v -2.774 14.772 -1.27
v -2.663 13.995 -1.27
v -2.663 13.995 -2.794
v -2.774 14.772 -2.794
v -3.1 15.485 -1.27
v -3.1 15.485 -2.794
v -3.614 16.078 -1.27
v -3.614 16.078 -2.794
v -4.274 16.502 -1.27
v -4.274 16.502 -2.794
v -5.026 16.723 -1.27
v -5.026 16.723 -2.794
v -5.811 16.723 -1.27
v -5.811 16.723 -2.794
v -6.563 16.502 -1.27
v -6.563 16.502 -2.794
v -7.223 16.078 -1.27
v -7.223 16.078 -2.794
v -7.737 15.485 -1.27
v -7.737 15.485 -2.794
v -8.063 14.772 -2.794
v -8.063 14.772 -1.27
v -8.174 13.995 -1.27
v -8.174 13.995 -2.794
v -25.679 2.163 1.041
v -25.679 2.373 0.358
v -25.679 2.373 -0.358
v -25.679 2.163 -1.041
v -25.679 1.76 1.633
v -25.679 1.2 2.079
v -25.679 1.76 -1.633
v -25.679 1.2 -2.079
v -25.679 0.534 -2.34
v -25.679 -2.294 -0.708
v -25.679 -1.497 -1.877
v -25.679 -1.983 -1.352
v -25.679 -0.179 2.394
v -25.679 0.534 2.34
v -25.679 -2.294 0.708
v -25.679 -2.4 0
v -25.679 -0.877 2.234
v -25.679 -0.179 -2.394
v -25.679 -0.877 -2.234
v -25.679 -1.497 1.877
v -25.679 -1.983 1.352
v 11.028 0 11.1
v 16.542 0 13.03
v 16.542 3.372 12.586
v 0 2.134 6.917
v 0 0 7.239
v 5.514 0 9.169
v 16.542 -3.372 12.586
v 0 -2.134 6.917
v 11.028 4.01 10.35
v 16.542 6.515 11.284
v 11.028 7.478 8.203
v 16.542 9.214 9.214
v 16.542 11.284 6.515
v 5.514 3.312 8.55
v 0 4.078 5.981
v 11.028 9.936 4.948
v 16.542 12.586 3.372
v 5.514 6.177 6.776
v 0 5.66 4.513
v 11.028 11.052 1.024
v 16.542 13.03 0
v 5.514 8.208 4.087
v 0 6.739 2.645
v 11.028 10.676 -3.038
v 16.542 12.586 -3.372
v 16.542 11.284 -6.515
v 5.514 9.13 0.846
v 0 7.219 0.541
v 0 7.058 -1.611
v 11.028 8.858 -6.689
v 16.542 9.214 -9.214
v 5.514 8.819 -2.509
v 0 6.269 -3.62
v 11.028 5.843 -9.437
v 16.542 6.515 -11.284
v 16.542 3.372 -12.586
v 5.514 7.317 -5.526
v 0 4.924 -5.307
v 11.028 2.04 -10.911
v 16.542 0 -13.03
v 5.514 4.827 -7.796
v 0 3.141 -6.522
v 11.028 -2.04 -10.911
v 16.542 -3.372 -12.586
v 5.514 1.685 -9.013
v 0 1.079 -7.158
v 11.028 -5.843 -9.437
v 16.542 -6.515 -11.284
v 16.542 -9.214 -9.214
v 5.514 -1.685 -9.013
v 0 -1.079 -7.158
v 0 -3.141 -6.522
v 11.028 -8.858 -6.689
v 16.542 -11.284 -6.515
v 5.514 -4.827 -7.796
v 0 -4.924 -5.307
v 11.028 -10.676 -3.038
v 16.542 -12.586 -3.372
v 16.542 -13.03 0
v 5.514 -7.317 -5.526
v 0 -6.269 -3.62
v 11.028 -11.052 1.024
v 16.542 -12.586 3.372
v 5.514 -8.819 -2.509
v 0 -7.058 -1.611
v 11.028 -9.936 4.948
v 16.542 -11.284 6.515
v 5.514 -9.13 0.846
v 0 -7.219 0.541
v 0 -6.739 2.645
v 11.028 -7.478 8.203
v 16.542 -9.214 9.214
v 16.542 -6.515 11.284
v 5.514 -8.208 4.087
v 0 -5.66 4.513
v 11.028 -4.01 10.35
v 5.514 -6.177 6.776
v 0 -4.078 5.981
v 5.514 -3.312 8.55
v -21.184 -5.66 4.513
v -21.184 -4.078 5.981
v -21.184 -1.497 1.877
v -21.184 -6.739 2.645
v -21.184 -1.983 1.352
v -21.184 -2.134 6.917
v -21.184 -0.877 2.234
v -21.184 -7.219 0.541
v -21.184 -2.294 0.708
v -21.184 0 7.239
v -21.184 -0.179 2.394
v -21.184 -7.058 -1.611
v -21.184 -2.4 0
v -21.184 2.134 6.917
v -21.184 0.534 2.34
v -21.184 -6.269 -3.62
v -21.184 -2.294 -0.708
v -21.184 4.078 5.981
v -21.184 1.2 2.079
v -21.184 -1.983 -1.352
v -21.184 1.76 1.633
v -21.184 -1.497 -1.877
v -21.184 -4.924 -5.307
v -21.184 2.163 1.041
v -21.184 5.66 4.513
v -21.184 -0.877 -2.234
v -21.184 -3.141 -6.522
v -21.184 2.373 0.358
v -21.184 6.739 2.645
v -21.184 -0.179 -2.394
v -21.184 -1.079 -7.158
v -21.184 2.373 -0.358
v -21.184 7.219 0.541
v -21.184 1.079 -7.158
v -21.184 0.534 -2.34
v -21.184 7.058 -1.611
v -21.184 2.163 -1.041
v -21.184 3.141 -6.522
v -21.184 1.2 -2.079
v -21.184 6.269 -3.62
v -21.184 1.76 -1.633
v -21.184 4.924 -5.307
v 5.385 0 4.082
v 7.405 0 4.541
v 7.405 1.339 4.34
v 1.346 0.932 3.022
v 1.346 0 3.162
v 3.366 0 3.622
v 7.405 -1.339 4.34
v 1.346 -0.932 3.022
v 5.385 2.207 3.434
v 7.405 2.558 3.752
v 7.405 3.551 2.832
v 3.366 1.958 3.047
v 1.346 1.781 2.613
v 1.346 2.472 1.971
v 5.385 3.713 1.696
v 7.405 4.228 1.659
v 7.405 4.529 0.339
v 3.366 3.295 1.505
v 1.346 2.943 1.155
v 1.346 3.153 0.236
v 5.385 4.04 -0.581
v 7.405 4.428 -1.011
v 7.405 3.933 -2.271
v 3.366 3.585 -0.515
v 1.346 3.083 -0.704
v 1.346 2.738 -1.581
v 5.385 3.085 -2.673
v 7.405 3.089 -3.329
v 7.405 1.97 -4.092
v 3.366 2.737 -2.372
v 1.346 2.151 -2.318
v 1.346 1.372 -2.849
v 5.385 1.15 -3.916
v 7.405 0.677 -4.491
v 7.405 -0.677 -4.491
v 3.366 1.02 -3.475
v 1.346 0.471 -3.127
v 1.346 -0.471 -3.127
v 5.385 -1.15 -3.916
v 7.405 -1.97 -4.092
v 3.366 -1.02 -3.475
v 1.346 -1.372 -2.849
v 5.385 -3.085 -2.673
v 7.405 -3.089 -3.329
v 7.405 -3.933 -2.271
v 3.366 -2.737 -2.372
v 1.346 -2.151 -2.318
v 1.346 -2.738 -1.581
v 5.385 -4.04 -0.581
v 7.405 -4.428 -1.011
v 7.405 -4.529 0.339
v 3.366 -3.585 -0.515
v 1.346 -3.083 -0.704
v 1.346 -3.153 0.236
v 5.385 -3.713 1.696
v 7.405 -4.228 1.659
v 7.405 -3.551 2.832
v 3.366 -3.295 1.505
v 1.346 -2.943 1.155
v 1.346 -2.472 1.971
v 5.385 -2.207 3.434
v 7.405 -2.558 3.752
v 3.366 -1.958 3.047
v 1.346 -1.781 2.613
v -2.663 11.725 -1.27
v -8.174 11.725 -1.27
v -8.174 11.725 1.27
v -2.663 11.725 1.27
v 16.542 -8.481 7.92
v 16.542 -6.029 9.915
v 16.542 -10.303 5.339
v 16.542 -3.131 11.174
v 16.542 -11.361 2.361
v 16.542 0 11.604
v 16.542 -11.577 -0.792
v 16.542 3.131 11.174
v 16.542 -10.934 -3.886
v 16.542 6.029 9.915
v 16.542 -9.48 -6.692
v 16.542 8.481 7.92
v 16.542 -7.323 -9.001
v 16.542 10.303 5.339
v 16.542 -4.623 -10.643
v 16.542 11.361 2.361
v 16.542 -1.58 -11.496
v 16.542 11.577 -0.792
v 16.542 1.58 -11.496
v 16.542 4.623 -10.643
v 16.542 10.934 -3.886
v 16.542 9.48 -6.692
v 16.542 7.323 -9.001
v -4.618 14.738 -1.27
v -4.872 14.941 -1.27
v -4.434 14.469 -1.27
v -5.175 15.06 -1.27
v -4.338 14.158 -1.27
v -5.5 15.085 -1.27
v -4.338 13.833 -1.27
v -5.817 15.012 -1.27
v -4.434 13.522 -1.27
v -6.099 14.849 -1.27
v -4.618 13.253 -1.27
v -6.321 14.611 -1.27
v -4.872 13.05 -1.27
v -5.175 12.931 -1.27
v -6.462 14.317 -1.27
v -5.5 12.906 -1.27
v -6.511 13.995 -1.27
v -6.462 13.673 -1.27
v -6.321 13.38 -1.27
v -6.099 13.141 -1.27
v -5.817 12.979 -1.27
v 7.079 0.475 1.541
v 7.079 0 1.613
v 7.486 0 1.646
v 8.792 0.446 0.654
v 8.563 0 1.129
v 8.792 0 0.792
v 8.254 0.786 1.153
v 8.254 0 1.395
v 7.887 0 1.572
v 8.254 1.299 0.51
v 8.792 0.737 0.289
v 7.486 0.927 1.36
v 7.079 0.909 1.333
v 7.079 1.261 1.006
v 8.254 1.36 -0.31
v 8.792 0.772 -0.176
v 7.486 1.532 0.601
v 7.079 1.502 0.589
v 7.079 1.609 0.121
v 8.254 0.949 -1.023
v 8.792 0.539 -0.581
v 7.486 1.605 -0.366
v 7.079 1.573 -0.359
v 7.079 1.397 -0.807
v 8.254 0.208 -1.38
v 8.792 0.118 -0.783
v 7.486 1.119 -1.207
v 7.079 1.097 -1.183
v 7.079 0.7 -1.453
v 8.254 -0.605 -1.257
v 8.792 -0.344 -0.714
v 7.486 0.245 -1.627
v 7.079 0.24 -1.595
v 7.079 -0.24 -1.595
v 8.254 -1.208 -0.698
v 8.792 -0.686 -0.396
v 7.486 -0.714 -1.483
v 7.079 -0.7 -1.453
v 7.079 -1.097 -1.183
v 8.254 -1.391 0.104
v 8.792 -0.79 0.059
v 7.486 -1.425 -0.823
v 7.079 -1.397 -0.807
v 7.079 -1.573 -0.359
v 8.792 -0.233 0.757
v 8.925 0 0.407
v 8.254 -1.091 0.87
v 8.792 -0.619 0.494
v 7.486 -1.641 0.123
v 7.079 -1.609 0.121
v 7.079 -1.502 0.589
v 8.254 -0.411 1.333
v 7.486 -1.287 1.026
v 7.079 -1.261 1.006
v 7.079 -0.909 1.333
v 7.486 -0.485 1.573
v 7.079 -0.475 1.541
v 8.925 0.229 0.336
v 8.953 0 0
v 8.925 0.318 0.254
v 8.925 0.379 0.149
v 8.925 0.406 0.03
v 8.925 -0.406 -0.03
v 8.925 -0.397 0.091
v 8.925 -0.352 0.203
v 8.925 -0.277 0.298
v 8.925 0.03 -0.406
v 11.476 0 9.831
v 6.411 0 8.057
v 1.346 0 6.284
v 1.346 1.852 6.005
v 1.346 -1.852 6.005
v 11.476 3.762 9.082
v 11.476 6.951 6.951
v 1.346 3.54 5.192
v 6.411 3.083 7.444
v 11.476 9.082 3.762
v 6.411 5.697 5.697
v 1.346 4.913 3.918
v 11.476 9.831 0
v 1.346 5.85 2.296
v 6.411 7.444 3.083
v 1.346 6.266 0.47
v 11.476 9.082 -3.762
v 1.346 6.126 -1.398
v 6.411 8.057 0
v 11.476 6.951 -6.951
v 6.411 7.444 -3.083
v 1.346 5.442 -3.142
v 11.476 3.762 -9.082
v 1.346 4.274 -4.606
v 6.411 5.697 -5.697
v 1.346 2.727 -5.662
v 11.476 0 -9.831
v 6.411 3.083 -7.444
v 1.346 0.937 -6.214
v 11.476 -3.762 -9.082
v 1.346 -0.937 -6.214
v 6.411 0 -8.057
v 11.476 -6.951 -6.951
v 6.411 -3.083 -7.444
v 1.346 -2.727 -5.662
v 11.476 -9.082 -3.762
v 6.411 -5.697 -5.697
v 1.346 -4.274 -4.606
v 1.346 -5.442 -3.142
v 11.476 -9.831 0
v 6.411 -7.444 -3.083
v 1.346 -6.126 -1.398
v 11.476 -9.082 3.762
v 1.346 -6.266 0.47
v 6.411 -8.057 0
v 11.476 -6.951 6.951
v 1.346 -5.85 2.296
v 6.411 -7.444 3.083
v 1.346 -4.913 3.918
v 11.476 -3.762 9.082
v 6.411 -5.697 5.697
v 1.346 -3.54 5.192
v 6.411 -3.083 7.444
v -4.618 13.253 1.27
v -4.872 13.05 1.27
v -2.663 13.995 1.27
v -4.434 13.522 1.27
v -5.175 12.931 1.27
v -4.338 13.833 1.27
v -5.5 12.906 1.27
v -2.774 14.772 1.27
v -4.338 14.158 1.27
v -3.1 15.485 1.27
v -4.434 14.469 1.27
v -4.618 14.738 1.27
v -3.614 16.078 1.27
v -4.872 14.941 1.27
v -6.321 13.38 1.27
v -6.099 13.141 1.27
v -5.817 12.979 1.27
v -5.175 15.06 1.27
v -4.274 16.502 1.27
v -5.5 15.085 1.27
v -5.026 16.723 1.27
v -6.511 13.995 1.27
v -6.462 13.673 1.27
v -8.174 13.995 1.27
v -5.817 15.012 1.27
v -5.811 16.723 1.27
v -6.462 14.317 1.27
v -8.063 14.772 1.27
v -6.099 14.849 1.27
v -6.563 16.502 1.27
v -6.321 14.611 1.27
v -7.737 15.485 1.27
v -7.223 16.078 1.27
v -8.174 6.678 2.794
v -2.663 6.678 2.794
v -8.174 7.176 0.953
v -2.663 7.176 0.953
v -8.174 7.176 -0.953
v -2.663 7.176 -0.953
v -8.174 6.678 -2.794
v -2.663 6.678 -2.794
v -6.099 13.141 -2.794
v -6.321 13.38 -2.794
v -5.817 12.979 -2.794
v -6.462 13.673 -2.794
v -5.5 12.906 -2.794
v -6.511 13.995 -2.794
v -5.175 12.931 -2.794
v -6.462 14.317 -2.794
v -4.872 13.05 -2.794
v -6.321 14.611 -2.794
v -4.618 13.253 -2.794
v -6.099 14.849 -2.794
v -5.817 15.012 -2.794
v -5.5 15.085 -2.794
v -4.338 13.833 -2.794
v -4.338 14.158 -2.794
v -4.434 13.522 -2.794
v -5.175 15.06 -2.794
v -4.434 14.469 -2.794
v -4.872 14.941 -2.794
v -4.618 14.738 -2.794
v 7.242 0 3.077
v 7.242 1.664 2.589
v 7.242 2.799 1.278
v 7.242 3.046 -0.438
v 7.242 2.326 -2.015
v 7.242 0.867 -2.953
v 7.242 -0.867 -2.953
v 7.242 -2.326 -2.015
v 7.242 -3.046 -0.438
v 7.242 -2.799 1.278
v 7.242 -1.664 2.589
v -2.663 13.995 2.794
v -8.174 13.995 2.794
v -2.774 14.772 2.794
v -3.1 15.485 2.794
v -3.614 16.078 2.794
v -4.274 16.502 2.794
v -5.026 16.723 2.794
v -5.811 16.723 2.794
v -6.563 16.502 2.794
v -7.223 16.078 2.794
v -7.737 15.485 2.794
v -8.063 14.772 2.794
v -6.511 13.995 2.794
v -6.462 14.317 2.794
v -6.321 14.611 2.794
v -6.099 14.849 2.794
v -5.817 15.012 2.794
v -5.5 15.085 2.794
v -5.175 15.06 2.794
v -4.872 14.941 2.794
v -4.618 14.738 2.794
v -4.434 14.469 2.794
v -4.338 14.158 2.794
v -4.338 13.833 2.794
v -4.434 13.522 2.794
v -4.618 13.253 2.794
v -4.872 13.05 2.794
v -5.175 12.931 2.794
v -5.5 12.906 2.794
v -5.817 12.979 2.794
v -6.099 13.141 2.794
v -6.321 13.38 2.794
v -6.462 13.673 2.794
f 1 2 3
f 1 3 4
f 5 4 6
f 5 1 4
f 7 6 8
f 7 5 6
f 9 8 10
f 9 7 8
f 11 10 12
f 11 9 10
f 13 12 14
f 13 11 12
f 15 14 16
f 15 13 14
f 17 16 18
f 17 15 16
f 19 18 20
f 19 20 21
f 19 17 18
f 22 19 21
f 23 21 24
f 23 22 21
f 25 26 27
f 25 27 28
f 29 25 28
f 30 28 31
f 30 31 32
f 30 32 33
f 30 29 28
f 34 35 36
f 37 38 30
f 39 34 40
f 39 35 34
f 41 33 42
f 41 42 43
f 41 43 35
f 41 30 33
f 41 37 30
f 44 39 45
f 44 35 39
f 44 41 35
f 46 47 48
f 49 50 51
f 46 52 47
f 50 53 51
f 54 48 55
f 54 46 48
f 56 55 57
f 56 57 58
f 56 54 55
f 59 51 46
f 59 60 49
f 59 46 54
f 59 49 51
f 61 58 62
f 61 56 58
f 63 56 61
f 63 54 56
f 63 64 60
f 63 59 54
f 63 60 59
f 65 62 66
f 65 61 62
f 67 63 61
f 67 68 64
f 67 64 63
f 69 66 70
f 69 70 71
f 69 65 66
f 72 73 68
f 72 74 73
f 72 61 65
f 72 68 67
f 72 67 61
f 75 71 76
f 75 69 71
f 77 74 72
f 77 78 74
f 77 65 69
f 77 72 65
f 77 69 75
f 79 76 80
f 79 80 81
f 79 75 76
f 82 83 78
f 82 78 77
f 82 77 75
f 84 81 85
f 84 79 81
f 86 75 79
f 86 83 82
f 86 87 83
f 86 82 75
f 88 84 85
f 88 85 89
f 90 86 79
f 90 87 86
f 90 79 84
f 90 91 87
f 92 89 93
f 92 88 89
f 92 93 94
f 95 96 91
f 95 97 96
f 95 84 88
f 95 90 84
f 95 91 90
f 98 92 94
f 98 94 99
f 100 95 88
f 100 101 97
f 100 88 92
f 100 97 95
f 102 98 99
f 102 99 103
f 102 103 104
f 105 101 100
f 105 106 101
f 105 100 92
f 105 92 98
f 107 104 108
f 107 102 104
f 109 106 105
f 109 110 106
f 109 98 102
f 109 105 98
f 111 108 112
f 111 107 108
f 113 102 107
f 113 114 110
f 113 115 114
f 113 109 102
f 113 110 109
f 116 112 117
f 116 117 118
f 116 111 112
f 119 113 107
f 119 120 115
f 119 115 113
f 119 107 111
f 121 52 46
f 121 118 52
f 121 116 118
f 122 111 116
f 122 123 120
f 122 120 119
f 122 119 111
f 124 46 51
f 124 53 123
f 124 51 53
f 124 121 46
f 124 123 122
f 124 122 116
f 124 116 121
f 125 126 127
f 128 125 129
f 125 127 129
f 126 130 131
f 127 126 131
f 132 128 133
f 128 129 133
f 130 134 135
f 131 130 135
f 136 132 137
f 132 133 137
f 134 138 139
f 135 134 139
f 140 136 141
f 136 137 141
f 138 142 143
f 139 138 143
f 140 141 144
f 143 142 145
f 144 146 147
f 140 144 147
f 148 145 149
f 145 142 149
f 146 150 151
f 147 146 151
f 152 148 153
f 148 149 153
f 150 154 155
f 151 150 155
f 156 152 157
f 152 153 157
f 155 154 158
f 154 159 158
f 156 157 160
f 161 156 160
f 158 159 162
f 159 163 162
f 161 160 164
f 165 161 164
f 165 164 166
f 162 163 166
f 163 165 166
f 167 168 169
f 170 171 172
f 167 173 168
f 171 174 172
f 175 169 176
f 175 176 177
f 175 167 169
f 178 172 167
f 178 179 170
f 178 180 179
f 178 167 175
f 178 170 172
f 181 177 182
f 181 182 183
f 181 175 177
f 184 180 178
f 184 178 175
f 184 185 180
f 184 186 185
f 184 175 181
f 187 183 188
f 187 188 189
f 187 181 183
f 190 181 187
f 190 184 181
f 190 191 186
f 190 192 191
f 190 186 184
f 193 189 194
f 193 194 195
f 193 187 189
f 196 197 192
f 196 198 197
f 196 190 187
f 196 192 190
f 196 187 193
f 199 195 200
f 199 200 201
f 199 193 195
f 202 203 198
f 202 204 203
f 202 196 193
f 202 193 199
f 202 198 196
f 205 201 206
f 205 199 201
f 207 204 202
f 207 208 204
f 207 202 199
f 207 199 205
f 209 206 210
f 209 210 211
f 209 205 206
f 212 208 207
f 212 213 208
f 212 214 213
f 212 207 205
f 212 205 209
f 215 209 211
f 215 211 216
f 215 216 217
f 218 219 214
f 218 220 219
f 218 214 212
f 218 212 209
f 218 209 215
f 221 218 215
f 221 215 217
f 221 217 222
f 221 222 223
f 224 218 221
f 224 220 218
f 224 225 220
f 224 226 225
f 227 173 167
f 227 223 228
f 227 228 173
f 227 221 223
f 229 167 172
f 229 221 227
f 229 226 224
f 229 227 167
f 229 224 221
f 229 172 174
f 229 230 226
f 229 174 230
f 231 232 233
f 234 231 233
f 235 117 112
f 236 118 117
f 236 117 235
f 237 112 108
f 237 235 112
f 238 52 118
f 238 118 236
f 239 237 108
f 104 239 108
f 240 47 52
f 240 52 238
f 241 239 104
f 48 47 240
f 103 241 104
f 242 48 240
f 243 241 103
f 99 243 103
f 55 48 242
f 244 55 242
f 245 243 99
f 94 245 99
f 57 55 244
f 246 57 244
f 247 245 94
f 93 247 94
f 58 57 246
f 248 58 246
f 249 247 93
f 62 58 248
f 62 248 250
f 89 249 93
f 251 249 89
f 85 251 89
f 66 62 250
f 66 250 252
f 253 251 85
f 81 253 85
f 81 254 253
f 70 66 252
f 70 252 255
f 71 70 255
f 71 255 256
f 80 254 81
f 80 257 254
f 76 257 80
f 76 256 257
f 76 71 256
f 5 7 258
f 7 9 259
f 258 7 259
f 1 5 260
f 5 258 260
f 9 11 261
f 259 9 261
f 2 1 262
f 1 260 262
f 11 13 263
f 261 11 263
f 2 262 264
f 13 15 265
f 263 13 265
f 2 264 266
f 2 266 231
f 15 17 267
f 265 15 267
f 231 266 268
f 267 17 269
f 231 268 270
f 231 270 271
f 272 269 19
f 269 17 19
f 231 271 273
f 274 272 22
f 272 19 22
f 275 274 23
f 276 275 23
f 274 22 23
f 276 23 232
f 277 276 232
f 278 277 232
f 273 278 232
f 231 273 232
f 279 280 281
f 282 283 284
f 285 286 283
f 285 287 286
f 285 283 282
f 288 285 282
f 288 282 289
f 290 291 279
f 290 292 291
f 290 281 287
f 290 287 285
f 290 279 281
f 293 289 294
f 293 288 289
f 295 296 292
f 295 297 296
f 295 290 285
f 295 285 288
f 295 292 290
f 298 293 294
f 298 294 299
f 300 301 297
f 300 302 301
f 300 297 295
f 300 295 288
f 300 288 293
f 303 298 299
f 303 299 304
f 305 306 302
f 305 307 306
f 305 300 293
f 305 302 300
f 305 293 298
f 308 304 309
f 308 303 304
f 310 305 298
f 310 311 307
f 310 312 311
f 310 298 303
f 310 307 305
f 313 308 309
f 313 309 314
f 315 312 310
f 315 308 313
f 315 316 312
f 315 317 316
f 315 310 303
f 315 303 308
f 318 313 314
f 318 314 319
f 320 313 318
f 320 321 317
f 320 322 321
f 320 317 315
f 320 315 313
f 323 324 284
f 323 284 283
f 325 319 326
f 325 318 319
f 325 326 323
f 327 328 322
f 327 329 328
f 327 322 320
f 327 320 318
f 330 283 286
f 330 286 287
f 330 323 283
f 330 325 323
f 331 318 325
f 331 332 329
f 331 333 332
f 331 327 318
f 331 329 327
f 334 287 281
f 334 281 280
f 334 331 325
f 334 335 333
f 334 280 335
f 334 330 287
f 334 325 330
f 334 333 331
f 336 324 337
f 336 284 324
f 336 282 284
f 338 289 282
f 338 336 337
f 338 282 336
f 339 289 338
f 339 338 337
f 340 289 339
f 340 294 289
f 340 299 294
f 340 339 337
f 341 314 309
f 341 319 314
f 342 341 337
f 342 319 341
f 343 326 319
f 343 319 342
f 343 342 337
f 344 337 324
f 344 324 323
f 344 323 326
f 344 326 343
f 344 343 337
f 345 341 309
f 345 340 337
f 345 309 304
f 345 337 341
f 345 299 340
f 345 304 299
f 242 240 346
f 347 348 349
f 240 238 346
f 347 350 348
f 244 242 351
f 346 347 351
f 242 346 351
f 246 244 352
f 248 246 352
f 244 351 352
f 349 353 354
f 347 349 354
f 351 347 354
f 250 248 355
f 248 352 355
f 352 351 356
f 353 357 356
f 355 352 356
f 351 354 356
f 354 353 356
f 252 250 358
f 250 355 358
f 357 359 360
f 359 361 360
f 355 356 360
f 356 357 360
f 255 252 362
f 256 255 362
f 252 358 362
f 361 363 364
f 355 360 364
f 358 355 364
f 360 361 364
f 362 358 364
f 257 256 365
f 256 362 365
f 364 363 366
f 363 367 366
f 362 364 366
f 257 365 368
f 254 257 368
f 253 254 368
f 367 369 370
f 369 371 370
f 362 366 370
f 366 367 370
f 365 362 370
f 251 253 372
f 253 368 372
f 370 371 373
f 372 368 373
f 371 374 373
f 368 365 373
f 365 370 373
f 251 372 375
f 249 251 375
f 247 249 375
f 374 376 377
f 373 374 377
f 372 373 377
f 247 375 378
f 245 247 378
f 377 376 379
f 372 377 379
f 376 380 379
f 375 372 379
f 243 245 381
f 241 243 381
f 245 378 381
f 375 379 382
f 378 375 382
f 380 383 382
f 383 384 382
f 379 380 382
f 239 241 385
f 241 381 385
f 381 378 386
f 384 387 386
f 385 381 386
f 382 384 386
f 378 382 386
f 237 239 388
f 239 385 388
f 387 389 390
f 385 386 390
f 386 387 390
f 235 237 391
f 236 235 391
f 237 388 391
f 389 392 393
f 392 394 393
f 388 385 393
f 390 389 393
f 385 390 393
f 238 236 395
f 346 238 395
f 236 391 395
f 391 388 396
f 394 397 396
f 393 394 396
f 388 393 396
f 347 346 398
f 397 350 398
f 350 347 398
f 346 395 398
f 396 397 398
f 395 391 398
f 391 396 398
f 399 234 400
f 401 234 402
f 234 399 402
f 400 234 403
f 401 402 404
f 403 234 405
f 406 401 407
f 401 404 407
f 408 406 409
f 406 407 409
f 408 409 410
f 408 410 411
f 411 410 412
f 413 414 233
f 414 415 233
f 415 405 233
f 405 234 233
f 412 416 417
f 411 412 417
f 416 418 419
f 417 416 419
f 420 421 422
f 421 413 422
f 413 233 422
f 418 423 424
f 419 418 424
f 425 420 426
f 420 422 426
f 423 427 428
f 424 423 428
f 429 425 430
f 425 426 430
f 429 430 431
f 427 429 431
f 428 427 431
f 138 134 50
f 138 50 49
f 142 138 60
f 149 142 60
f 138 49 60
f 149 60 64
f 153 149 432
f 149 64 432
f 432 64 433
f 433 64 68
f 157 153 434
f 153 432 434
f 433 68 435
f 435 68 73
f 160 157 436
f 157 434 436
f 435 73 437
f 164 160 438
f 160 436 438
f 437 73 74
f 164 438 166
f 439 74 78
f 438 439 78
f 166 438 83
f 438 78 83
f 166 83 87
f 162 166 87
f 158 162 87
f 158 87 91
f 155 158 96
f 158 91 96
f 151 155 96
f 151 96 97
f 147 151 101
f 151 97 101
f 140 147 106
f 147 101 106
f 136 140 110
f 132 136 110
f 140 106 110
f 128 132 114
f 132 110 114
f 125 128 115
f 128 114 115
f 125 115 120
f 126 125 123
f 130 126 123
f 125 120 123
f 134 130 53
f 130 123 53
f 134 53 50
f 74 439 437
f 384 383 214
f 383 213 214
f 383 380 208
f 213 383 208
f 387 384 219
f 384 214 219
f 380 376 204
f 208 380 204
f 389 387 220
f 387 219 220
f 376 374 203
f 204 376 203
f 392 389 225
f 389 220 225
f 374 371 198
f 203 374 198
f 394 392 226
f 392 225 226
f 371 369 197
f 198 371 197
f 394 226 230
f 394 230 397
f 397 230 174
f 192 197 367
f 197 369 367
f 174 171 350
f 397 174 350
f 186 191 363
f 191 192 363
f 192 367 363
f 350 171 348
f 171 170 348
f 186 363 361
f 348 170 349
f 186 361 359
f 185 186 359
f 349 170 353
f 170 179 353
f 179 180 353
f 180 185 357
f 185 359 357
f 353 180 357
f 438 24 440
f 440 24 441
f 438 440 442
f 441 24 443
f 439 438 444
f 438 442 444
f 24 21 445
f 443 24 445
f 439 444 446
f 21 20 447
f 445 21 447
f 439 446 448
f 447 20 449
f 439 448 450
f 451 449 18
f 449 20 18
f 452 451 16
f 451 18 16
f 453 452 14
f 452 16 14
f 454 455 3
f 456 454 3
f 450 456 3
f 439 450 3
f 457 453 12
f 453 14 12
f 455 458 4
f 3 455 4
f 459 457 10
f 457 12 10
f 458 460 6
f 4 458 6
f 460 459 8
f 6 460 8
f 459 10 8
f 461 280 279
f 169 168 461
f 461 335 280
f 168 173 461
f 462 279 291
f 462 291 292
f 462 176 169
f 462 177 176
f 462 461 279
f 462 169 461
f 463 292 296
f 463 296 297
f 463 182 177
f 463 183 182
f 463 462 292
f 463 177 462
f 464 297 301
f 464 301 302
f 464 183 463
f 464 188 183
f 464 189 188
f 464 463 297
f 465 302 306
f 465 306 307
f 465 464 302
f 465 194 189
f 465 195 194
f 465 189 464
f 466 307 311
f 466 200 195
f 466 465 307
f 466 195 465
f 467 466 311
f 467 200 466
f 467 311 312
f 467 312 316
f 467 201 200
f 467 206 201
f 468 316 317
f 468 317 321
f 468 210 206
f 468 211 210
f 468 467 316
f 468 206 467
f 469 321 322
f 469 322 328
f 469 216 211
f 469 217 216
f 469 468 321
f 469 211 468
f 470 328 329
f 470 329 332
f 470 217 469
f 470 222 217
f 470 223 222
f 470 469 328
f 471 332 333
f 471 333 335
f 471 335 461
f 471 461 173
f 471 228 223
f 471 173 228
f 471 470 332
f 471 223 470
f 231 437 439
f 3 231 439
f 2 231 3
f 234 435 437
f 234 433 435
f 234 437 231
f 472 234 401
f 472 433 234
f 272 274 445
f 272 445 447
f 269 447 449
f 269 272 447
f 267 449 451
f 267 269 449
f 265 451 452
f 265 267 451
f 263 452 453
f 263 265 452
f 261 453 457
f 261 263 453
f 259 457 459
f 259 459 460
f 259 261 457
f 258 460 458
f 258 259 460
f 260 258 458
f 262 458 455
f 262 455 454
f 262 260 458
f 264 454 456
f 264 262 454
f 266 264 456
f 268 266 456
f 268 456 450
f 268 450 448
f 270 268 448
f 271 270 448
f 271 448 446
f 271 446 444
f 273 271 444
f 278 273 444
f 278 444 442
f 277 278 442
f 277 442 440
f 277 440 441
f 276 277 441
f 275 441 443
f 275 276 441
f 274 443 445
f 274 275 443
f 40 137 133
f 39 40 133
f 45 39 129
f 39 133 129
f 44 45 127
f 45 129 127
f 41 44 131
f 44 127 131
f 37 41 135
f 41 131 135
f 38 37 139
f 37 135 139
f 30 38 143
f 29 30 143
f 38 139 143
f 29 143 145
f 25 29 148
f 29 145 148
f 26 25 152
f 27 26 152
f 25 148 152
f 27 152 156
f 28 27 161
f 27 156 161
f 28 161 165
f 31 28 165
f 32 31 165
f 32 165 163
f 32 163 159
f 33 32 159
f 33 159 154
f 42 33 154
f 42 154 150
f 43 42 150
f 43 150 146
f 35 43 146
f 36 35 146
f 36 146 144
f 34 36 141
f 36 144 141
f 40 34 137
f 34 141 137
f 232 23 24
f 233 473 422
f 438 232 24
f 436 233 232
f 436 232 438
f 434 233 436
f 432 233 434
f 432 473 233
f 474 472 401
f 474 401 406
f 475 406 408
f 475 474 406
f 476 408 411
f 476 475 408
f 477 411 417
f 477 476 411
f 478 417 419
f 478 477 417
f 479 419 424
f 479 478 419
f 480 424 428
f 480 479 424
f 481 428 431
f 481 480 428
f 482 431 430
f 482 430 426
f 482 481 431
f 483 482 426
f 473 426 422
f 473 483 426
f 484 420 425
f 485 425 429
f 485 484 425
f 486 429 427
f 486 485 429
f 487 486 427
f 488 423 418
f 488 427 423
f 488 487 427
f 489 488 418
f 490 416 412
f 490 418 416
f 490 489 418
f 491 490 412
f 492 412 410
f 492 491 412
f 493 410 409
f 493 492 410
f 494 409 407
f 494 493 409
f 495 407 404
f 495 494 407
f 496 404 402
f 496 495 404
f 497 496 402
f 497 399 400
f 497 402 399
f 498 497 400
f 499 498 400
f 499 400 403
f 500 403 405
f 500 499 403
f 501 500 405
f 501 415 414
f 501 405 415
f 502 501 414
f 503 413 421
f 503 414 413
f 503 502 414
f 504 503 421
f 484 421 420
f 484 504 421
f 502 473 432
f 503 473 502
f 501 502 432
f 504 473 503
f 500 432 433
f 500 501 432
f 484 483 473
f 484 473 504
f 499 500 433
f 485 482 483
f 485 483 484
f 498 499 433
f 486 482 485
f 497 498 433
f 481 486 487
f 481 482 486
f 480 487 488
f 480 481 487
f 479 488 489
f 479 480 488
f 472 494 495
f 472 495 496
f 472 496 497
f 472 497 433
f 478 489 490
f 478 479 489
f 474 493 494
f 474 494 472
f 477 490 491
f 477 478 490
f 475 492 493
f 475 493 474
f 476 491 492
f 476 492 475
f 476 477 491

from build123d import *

# Parameters (mm, degrees)
F2_T     = -1.3462
F0_W     = 21.1836
F0_H     = 7.239
F4_R     = 2.4003
F5_DEPTH = 4.4958
F7_DEPTH = 2.794
F8_W     = 2.2705799568
F8_H     = 2.54
F8_W_2   = 2.7586200432
F9_DEPTH = 10.16


with BuildPart() as f1:
    # F0 (on Front) → F1 (revolve)
    with BuildSketch(Plane.XZ):
        Polygon((0, 7.239), (0, 0), (16.5415440198, 0), (16.5415440198, 13.0302), align=None)
    revolve(axis=Axis((-10.5918, 0, 0), (-1, 0, 0)))

    # F2
    f2_openings = [f1.faces().sort_by_distance(p)[0] for p in [
        (16.541544, 0, 0),
    ]]
    offset(amount=F2_T, openings=f2_openings)

    # F0 (on Front) → F3 (revolve)
    with BuildSketch(Plane.XZ):
        with Locations((-10.5918, 3.6195)):
            Rectangle(F0_W, F0_H)
    revolve(axis=Axis((-10.5918, 0, 0), (-1, 0, 0)))

    # F4 (on face) → F5 (join)
    with BuildSketch(Plane(origin=(-21.1836, 0, 0), x_dir=(0, -1, 0), z_dir=(-1, 0, 0))):
        Circle(F4_R)
    extrude(amount=F5_DEPTH)

    # F6 (on Top) → F7 (join, symmetric)
    with BuildSketch(Plane.XY):
        with BuildLine():
            Line((-8.1743659384, 13.9954), (-8.1743659384, 4.5510675645))
            Line((-8.1743659384, 4.5510675645), (-2.6625659384, 4.5510675645))
            Line((-2.6625659384, 4.5510675645), (-2.6625659384, 13.9954))
            ThreePointArc((-2.6625659384, 13.9954), (-5.4184659384, 11.2395), (-8.1743659384, 13.9954))
        make_face()
        with BuildLine():
            ThreePointArc((-2.6625659384, 13.9954), (-5.4184659384, 16.7513), (-8.1743659384, 13.9954))
            Line((-8.1743659384, 13.9954), (-6.5106659384, 13.9954))
            ThreePointArc((-6.5106659384, 13.9954), (-5.4184659384, 15.0876), (-4.3262659384, 13.9954))
            Line((-4.3262659384, 13.9954), (-2.6625659384, 13.9954))
        make_face()
        with BuildLine():
            Line((-6.5106659384, 13.9954), (-8.1743659384, 13.9954))
            ThreePointArc((-8.1743659384, 13.9954), (-5.4184659384, 11.2395), (-2.6625659384, 13.9954))
            Line((-2.6625659384, 13.9954), (-4.3262659384, 13.9954))
            ThreePointArc((-4.3262659384, 13.9954), (-5.4184659384, 12.9032), (-6.5106659384, 13.9954))
        make_face()
    extrude(amount=F7_DEPTH, both=True)

    # F8 (on face) → F9 (cut)
    with BuildSketch(Plane(origin=(-8.1743659384, 0, 0), x_dir=(0, -1, 0), z_dir=(-1, 0, 0))):
        with Locations((-12.8601100216, 0)):
            Rectangle(F8_W, F8_H)
        with Locations((-15.3747100216, 0)):
            Rectangle(F8_W_2, F8_H)
    extrude(amount=-F9_DEPTH, mode=Mode.SUBTRACT)

    # F10 (on Front) → F11 (revolve)
    with BuildSketch(Plane.XZ):
        with BuildLine():
            Line((7.4050883165, 4.5414811682), (0, 2.8554751822))
            Line((0, 2.8554751822), (0, 0))
            Line((0, 0), (8.9534996077, 0))
            ThreePointArc((8.9534996077, 0), (8.4175012065, 1.2725301509), (7.0793638567, 1.6131409325))
            Line((7.0793638567, 1.6131409325), (7.4050883165, 4.5414811682))
        make_face()
    revolve(axis=Axis((8.2707720099, 0, 0), (-1, 0, 0)))


solid = f1.part
